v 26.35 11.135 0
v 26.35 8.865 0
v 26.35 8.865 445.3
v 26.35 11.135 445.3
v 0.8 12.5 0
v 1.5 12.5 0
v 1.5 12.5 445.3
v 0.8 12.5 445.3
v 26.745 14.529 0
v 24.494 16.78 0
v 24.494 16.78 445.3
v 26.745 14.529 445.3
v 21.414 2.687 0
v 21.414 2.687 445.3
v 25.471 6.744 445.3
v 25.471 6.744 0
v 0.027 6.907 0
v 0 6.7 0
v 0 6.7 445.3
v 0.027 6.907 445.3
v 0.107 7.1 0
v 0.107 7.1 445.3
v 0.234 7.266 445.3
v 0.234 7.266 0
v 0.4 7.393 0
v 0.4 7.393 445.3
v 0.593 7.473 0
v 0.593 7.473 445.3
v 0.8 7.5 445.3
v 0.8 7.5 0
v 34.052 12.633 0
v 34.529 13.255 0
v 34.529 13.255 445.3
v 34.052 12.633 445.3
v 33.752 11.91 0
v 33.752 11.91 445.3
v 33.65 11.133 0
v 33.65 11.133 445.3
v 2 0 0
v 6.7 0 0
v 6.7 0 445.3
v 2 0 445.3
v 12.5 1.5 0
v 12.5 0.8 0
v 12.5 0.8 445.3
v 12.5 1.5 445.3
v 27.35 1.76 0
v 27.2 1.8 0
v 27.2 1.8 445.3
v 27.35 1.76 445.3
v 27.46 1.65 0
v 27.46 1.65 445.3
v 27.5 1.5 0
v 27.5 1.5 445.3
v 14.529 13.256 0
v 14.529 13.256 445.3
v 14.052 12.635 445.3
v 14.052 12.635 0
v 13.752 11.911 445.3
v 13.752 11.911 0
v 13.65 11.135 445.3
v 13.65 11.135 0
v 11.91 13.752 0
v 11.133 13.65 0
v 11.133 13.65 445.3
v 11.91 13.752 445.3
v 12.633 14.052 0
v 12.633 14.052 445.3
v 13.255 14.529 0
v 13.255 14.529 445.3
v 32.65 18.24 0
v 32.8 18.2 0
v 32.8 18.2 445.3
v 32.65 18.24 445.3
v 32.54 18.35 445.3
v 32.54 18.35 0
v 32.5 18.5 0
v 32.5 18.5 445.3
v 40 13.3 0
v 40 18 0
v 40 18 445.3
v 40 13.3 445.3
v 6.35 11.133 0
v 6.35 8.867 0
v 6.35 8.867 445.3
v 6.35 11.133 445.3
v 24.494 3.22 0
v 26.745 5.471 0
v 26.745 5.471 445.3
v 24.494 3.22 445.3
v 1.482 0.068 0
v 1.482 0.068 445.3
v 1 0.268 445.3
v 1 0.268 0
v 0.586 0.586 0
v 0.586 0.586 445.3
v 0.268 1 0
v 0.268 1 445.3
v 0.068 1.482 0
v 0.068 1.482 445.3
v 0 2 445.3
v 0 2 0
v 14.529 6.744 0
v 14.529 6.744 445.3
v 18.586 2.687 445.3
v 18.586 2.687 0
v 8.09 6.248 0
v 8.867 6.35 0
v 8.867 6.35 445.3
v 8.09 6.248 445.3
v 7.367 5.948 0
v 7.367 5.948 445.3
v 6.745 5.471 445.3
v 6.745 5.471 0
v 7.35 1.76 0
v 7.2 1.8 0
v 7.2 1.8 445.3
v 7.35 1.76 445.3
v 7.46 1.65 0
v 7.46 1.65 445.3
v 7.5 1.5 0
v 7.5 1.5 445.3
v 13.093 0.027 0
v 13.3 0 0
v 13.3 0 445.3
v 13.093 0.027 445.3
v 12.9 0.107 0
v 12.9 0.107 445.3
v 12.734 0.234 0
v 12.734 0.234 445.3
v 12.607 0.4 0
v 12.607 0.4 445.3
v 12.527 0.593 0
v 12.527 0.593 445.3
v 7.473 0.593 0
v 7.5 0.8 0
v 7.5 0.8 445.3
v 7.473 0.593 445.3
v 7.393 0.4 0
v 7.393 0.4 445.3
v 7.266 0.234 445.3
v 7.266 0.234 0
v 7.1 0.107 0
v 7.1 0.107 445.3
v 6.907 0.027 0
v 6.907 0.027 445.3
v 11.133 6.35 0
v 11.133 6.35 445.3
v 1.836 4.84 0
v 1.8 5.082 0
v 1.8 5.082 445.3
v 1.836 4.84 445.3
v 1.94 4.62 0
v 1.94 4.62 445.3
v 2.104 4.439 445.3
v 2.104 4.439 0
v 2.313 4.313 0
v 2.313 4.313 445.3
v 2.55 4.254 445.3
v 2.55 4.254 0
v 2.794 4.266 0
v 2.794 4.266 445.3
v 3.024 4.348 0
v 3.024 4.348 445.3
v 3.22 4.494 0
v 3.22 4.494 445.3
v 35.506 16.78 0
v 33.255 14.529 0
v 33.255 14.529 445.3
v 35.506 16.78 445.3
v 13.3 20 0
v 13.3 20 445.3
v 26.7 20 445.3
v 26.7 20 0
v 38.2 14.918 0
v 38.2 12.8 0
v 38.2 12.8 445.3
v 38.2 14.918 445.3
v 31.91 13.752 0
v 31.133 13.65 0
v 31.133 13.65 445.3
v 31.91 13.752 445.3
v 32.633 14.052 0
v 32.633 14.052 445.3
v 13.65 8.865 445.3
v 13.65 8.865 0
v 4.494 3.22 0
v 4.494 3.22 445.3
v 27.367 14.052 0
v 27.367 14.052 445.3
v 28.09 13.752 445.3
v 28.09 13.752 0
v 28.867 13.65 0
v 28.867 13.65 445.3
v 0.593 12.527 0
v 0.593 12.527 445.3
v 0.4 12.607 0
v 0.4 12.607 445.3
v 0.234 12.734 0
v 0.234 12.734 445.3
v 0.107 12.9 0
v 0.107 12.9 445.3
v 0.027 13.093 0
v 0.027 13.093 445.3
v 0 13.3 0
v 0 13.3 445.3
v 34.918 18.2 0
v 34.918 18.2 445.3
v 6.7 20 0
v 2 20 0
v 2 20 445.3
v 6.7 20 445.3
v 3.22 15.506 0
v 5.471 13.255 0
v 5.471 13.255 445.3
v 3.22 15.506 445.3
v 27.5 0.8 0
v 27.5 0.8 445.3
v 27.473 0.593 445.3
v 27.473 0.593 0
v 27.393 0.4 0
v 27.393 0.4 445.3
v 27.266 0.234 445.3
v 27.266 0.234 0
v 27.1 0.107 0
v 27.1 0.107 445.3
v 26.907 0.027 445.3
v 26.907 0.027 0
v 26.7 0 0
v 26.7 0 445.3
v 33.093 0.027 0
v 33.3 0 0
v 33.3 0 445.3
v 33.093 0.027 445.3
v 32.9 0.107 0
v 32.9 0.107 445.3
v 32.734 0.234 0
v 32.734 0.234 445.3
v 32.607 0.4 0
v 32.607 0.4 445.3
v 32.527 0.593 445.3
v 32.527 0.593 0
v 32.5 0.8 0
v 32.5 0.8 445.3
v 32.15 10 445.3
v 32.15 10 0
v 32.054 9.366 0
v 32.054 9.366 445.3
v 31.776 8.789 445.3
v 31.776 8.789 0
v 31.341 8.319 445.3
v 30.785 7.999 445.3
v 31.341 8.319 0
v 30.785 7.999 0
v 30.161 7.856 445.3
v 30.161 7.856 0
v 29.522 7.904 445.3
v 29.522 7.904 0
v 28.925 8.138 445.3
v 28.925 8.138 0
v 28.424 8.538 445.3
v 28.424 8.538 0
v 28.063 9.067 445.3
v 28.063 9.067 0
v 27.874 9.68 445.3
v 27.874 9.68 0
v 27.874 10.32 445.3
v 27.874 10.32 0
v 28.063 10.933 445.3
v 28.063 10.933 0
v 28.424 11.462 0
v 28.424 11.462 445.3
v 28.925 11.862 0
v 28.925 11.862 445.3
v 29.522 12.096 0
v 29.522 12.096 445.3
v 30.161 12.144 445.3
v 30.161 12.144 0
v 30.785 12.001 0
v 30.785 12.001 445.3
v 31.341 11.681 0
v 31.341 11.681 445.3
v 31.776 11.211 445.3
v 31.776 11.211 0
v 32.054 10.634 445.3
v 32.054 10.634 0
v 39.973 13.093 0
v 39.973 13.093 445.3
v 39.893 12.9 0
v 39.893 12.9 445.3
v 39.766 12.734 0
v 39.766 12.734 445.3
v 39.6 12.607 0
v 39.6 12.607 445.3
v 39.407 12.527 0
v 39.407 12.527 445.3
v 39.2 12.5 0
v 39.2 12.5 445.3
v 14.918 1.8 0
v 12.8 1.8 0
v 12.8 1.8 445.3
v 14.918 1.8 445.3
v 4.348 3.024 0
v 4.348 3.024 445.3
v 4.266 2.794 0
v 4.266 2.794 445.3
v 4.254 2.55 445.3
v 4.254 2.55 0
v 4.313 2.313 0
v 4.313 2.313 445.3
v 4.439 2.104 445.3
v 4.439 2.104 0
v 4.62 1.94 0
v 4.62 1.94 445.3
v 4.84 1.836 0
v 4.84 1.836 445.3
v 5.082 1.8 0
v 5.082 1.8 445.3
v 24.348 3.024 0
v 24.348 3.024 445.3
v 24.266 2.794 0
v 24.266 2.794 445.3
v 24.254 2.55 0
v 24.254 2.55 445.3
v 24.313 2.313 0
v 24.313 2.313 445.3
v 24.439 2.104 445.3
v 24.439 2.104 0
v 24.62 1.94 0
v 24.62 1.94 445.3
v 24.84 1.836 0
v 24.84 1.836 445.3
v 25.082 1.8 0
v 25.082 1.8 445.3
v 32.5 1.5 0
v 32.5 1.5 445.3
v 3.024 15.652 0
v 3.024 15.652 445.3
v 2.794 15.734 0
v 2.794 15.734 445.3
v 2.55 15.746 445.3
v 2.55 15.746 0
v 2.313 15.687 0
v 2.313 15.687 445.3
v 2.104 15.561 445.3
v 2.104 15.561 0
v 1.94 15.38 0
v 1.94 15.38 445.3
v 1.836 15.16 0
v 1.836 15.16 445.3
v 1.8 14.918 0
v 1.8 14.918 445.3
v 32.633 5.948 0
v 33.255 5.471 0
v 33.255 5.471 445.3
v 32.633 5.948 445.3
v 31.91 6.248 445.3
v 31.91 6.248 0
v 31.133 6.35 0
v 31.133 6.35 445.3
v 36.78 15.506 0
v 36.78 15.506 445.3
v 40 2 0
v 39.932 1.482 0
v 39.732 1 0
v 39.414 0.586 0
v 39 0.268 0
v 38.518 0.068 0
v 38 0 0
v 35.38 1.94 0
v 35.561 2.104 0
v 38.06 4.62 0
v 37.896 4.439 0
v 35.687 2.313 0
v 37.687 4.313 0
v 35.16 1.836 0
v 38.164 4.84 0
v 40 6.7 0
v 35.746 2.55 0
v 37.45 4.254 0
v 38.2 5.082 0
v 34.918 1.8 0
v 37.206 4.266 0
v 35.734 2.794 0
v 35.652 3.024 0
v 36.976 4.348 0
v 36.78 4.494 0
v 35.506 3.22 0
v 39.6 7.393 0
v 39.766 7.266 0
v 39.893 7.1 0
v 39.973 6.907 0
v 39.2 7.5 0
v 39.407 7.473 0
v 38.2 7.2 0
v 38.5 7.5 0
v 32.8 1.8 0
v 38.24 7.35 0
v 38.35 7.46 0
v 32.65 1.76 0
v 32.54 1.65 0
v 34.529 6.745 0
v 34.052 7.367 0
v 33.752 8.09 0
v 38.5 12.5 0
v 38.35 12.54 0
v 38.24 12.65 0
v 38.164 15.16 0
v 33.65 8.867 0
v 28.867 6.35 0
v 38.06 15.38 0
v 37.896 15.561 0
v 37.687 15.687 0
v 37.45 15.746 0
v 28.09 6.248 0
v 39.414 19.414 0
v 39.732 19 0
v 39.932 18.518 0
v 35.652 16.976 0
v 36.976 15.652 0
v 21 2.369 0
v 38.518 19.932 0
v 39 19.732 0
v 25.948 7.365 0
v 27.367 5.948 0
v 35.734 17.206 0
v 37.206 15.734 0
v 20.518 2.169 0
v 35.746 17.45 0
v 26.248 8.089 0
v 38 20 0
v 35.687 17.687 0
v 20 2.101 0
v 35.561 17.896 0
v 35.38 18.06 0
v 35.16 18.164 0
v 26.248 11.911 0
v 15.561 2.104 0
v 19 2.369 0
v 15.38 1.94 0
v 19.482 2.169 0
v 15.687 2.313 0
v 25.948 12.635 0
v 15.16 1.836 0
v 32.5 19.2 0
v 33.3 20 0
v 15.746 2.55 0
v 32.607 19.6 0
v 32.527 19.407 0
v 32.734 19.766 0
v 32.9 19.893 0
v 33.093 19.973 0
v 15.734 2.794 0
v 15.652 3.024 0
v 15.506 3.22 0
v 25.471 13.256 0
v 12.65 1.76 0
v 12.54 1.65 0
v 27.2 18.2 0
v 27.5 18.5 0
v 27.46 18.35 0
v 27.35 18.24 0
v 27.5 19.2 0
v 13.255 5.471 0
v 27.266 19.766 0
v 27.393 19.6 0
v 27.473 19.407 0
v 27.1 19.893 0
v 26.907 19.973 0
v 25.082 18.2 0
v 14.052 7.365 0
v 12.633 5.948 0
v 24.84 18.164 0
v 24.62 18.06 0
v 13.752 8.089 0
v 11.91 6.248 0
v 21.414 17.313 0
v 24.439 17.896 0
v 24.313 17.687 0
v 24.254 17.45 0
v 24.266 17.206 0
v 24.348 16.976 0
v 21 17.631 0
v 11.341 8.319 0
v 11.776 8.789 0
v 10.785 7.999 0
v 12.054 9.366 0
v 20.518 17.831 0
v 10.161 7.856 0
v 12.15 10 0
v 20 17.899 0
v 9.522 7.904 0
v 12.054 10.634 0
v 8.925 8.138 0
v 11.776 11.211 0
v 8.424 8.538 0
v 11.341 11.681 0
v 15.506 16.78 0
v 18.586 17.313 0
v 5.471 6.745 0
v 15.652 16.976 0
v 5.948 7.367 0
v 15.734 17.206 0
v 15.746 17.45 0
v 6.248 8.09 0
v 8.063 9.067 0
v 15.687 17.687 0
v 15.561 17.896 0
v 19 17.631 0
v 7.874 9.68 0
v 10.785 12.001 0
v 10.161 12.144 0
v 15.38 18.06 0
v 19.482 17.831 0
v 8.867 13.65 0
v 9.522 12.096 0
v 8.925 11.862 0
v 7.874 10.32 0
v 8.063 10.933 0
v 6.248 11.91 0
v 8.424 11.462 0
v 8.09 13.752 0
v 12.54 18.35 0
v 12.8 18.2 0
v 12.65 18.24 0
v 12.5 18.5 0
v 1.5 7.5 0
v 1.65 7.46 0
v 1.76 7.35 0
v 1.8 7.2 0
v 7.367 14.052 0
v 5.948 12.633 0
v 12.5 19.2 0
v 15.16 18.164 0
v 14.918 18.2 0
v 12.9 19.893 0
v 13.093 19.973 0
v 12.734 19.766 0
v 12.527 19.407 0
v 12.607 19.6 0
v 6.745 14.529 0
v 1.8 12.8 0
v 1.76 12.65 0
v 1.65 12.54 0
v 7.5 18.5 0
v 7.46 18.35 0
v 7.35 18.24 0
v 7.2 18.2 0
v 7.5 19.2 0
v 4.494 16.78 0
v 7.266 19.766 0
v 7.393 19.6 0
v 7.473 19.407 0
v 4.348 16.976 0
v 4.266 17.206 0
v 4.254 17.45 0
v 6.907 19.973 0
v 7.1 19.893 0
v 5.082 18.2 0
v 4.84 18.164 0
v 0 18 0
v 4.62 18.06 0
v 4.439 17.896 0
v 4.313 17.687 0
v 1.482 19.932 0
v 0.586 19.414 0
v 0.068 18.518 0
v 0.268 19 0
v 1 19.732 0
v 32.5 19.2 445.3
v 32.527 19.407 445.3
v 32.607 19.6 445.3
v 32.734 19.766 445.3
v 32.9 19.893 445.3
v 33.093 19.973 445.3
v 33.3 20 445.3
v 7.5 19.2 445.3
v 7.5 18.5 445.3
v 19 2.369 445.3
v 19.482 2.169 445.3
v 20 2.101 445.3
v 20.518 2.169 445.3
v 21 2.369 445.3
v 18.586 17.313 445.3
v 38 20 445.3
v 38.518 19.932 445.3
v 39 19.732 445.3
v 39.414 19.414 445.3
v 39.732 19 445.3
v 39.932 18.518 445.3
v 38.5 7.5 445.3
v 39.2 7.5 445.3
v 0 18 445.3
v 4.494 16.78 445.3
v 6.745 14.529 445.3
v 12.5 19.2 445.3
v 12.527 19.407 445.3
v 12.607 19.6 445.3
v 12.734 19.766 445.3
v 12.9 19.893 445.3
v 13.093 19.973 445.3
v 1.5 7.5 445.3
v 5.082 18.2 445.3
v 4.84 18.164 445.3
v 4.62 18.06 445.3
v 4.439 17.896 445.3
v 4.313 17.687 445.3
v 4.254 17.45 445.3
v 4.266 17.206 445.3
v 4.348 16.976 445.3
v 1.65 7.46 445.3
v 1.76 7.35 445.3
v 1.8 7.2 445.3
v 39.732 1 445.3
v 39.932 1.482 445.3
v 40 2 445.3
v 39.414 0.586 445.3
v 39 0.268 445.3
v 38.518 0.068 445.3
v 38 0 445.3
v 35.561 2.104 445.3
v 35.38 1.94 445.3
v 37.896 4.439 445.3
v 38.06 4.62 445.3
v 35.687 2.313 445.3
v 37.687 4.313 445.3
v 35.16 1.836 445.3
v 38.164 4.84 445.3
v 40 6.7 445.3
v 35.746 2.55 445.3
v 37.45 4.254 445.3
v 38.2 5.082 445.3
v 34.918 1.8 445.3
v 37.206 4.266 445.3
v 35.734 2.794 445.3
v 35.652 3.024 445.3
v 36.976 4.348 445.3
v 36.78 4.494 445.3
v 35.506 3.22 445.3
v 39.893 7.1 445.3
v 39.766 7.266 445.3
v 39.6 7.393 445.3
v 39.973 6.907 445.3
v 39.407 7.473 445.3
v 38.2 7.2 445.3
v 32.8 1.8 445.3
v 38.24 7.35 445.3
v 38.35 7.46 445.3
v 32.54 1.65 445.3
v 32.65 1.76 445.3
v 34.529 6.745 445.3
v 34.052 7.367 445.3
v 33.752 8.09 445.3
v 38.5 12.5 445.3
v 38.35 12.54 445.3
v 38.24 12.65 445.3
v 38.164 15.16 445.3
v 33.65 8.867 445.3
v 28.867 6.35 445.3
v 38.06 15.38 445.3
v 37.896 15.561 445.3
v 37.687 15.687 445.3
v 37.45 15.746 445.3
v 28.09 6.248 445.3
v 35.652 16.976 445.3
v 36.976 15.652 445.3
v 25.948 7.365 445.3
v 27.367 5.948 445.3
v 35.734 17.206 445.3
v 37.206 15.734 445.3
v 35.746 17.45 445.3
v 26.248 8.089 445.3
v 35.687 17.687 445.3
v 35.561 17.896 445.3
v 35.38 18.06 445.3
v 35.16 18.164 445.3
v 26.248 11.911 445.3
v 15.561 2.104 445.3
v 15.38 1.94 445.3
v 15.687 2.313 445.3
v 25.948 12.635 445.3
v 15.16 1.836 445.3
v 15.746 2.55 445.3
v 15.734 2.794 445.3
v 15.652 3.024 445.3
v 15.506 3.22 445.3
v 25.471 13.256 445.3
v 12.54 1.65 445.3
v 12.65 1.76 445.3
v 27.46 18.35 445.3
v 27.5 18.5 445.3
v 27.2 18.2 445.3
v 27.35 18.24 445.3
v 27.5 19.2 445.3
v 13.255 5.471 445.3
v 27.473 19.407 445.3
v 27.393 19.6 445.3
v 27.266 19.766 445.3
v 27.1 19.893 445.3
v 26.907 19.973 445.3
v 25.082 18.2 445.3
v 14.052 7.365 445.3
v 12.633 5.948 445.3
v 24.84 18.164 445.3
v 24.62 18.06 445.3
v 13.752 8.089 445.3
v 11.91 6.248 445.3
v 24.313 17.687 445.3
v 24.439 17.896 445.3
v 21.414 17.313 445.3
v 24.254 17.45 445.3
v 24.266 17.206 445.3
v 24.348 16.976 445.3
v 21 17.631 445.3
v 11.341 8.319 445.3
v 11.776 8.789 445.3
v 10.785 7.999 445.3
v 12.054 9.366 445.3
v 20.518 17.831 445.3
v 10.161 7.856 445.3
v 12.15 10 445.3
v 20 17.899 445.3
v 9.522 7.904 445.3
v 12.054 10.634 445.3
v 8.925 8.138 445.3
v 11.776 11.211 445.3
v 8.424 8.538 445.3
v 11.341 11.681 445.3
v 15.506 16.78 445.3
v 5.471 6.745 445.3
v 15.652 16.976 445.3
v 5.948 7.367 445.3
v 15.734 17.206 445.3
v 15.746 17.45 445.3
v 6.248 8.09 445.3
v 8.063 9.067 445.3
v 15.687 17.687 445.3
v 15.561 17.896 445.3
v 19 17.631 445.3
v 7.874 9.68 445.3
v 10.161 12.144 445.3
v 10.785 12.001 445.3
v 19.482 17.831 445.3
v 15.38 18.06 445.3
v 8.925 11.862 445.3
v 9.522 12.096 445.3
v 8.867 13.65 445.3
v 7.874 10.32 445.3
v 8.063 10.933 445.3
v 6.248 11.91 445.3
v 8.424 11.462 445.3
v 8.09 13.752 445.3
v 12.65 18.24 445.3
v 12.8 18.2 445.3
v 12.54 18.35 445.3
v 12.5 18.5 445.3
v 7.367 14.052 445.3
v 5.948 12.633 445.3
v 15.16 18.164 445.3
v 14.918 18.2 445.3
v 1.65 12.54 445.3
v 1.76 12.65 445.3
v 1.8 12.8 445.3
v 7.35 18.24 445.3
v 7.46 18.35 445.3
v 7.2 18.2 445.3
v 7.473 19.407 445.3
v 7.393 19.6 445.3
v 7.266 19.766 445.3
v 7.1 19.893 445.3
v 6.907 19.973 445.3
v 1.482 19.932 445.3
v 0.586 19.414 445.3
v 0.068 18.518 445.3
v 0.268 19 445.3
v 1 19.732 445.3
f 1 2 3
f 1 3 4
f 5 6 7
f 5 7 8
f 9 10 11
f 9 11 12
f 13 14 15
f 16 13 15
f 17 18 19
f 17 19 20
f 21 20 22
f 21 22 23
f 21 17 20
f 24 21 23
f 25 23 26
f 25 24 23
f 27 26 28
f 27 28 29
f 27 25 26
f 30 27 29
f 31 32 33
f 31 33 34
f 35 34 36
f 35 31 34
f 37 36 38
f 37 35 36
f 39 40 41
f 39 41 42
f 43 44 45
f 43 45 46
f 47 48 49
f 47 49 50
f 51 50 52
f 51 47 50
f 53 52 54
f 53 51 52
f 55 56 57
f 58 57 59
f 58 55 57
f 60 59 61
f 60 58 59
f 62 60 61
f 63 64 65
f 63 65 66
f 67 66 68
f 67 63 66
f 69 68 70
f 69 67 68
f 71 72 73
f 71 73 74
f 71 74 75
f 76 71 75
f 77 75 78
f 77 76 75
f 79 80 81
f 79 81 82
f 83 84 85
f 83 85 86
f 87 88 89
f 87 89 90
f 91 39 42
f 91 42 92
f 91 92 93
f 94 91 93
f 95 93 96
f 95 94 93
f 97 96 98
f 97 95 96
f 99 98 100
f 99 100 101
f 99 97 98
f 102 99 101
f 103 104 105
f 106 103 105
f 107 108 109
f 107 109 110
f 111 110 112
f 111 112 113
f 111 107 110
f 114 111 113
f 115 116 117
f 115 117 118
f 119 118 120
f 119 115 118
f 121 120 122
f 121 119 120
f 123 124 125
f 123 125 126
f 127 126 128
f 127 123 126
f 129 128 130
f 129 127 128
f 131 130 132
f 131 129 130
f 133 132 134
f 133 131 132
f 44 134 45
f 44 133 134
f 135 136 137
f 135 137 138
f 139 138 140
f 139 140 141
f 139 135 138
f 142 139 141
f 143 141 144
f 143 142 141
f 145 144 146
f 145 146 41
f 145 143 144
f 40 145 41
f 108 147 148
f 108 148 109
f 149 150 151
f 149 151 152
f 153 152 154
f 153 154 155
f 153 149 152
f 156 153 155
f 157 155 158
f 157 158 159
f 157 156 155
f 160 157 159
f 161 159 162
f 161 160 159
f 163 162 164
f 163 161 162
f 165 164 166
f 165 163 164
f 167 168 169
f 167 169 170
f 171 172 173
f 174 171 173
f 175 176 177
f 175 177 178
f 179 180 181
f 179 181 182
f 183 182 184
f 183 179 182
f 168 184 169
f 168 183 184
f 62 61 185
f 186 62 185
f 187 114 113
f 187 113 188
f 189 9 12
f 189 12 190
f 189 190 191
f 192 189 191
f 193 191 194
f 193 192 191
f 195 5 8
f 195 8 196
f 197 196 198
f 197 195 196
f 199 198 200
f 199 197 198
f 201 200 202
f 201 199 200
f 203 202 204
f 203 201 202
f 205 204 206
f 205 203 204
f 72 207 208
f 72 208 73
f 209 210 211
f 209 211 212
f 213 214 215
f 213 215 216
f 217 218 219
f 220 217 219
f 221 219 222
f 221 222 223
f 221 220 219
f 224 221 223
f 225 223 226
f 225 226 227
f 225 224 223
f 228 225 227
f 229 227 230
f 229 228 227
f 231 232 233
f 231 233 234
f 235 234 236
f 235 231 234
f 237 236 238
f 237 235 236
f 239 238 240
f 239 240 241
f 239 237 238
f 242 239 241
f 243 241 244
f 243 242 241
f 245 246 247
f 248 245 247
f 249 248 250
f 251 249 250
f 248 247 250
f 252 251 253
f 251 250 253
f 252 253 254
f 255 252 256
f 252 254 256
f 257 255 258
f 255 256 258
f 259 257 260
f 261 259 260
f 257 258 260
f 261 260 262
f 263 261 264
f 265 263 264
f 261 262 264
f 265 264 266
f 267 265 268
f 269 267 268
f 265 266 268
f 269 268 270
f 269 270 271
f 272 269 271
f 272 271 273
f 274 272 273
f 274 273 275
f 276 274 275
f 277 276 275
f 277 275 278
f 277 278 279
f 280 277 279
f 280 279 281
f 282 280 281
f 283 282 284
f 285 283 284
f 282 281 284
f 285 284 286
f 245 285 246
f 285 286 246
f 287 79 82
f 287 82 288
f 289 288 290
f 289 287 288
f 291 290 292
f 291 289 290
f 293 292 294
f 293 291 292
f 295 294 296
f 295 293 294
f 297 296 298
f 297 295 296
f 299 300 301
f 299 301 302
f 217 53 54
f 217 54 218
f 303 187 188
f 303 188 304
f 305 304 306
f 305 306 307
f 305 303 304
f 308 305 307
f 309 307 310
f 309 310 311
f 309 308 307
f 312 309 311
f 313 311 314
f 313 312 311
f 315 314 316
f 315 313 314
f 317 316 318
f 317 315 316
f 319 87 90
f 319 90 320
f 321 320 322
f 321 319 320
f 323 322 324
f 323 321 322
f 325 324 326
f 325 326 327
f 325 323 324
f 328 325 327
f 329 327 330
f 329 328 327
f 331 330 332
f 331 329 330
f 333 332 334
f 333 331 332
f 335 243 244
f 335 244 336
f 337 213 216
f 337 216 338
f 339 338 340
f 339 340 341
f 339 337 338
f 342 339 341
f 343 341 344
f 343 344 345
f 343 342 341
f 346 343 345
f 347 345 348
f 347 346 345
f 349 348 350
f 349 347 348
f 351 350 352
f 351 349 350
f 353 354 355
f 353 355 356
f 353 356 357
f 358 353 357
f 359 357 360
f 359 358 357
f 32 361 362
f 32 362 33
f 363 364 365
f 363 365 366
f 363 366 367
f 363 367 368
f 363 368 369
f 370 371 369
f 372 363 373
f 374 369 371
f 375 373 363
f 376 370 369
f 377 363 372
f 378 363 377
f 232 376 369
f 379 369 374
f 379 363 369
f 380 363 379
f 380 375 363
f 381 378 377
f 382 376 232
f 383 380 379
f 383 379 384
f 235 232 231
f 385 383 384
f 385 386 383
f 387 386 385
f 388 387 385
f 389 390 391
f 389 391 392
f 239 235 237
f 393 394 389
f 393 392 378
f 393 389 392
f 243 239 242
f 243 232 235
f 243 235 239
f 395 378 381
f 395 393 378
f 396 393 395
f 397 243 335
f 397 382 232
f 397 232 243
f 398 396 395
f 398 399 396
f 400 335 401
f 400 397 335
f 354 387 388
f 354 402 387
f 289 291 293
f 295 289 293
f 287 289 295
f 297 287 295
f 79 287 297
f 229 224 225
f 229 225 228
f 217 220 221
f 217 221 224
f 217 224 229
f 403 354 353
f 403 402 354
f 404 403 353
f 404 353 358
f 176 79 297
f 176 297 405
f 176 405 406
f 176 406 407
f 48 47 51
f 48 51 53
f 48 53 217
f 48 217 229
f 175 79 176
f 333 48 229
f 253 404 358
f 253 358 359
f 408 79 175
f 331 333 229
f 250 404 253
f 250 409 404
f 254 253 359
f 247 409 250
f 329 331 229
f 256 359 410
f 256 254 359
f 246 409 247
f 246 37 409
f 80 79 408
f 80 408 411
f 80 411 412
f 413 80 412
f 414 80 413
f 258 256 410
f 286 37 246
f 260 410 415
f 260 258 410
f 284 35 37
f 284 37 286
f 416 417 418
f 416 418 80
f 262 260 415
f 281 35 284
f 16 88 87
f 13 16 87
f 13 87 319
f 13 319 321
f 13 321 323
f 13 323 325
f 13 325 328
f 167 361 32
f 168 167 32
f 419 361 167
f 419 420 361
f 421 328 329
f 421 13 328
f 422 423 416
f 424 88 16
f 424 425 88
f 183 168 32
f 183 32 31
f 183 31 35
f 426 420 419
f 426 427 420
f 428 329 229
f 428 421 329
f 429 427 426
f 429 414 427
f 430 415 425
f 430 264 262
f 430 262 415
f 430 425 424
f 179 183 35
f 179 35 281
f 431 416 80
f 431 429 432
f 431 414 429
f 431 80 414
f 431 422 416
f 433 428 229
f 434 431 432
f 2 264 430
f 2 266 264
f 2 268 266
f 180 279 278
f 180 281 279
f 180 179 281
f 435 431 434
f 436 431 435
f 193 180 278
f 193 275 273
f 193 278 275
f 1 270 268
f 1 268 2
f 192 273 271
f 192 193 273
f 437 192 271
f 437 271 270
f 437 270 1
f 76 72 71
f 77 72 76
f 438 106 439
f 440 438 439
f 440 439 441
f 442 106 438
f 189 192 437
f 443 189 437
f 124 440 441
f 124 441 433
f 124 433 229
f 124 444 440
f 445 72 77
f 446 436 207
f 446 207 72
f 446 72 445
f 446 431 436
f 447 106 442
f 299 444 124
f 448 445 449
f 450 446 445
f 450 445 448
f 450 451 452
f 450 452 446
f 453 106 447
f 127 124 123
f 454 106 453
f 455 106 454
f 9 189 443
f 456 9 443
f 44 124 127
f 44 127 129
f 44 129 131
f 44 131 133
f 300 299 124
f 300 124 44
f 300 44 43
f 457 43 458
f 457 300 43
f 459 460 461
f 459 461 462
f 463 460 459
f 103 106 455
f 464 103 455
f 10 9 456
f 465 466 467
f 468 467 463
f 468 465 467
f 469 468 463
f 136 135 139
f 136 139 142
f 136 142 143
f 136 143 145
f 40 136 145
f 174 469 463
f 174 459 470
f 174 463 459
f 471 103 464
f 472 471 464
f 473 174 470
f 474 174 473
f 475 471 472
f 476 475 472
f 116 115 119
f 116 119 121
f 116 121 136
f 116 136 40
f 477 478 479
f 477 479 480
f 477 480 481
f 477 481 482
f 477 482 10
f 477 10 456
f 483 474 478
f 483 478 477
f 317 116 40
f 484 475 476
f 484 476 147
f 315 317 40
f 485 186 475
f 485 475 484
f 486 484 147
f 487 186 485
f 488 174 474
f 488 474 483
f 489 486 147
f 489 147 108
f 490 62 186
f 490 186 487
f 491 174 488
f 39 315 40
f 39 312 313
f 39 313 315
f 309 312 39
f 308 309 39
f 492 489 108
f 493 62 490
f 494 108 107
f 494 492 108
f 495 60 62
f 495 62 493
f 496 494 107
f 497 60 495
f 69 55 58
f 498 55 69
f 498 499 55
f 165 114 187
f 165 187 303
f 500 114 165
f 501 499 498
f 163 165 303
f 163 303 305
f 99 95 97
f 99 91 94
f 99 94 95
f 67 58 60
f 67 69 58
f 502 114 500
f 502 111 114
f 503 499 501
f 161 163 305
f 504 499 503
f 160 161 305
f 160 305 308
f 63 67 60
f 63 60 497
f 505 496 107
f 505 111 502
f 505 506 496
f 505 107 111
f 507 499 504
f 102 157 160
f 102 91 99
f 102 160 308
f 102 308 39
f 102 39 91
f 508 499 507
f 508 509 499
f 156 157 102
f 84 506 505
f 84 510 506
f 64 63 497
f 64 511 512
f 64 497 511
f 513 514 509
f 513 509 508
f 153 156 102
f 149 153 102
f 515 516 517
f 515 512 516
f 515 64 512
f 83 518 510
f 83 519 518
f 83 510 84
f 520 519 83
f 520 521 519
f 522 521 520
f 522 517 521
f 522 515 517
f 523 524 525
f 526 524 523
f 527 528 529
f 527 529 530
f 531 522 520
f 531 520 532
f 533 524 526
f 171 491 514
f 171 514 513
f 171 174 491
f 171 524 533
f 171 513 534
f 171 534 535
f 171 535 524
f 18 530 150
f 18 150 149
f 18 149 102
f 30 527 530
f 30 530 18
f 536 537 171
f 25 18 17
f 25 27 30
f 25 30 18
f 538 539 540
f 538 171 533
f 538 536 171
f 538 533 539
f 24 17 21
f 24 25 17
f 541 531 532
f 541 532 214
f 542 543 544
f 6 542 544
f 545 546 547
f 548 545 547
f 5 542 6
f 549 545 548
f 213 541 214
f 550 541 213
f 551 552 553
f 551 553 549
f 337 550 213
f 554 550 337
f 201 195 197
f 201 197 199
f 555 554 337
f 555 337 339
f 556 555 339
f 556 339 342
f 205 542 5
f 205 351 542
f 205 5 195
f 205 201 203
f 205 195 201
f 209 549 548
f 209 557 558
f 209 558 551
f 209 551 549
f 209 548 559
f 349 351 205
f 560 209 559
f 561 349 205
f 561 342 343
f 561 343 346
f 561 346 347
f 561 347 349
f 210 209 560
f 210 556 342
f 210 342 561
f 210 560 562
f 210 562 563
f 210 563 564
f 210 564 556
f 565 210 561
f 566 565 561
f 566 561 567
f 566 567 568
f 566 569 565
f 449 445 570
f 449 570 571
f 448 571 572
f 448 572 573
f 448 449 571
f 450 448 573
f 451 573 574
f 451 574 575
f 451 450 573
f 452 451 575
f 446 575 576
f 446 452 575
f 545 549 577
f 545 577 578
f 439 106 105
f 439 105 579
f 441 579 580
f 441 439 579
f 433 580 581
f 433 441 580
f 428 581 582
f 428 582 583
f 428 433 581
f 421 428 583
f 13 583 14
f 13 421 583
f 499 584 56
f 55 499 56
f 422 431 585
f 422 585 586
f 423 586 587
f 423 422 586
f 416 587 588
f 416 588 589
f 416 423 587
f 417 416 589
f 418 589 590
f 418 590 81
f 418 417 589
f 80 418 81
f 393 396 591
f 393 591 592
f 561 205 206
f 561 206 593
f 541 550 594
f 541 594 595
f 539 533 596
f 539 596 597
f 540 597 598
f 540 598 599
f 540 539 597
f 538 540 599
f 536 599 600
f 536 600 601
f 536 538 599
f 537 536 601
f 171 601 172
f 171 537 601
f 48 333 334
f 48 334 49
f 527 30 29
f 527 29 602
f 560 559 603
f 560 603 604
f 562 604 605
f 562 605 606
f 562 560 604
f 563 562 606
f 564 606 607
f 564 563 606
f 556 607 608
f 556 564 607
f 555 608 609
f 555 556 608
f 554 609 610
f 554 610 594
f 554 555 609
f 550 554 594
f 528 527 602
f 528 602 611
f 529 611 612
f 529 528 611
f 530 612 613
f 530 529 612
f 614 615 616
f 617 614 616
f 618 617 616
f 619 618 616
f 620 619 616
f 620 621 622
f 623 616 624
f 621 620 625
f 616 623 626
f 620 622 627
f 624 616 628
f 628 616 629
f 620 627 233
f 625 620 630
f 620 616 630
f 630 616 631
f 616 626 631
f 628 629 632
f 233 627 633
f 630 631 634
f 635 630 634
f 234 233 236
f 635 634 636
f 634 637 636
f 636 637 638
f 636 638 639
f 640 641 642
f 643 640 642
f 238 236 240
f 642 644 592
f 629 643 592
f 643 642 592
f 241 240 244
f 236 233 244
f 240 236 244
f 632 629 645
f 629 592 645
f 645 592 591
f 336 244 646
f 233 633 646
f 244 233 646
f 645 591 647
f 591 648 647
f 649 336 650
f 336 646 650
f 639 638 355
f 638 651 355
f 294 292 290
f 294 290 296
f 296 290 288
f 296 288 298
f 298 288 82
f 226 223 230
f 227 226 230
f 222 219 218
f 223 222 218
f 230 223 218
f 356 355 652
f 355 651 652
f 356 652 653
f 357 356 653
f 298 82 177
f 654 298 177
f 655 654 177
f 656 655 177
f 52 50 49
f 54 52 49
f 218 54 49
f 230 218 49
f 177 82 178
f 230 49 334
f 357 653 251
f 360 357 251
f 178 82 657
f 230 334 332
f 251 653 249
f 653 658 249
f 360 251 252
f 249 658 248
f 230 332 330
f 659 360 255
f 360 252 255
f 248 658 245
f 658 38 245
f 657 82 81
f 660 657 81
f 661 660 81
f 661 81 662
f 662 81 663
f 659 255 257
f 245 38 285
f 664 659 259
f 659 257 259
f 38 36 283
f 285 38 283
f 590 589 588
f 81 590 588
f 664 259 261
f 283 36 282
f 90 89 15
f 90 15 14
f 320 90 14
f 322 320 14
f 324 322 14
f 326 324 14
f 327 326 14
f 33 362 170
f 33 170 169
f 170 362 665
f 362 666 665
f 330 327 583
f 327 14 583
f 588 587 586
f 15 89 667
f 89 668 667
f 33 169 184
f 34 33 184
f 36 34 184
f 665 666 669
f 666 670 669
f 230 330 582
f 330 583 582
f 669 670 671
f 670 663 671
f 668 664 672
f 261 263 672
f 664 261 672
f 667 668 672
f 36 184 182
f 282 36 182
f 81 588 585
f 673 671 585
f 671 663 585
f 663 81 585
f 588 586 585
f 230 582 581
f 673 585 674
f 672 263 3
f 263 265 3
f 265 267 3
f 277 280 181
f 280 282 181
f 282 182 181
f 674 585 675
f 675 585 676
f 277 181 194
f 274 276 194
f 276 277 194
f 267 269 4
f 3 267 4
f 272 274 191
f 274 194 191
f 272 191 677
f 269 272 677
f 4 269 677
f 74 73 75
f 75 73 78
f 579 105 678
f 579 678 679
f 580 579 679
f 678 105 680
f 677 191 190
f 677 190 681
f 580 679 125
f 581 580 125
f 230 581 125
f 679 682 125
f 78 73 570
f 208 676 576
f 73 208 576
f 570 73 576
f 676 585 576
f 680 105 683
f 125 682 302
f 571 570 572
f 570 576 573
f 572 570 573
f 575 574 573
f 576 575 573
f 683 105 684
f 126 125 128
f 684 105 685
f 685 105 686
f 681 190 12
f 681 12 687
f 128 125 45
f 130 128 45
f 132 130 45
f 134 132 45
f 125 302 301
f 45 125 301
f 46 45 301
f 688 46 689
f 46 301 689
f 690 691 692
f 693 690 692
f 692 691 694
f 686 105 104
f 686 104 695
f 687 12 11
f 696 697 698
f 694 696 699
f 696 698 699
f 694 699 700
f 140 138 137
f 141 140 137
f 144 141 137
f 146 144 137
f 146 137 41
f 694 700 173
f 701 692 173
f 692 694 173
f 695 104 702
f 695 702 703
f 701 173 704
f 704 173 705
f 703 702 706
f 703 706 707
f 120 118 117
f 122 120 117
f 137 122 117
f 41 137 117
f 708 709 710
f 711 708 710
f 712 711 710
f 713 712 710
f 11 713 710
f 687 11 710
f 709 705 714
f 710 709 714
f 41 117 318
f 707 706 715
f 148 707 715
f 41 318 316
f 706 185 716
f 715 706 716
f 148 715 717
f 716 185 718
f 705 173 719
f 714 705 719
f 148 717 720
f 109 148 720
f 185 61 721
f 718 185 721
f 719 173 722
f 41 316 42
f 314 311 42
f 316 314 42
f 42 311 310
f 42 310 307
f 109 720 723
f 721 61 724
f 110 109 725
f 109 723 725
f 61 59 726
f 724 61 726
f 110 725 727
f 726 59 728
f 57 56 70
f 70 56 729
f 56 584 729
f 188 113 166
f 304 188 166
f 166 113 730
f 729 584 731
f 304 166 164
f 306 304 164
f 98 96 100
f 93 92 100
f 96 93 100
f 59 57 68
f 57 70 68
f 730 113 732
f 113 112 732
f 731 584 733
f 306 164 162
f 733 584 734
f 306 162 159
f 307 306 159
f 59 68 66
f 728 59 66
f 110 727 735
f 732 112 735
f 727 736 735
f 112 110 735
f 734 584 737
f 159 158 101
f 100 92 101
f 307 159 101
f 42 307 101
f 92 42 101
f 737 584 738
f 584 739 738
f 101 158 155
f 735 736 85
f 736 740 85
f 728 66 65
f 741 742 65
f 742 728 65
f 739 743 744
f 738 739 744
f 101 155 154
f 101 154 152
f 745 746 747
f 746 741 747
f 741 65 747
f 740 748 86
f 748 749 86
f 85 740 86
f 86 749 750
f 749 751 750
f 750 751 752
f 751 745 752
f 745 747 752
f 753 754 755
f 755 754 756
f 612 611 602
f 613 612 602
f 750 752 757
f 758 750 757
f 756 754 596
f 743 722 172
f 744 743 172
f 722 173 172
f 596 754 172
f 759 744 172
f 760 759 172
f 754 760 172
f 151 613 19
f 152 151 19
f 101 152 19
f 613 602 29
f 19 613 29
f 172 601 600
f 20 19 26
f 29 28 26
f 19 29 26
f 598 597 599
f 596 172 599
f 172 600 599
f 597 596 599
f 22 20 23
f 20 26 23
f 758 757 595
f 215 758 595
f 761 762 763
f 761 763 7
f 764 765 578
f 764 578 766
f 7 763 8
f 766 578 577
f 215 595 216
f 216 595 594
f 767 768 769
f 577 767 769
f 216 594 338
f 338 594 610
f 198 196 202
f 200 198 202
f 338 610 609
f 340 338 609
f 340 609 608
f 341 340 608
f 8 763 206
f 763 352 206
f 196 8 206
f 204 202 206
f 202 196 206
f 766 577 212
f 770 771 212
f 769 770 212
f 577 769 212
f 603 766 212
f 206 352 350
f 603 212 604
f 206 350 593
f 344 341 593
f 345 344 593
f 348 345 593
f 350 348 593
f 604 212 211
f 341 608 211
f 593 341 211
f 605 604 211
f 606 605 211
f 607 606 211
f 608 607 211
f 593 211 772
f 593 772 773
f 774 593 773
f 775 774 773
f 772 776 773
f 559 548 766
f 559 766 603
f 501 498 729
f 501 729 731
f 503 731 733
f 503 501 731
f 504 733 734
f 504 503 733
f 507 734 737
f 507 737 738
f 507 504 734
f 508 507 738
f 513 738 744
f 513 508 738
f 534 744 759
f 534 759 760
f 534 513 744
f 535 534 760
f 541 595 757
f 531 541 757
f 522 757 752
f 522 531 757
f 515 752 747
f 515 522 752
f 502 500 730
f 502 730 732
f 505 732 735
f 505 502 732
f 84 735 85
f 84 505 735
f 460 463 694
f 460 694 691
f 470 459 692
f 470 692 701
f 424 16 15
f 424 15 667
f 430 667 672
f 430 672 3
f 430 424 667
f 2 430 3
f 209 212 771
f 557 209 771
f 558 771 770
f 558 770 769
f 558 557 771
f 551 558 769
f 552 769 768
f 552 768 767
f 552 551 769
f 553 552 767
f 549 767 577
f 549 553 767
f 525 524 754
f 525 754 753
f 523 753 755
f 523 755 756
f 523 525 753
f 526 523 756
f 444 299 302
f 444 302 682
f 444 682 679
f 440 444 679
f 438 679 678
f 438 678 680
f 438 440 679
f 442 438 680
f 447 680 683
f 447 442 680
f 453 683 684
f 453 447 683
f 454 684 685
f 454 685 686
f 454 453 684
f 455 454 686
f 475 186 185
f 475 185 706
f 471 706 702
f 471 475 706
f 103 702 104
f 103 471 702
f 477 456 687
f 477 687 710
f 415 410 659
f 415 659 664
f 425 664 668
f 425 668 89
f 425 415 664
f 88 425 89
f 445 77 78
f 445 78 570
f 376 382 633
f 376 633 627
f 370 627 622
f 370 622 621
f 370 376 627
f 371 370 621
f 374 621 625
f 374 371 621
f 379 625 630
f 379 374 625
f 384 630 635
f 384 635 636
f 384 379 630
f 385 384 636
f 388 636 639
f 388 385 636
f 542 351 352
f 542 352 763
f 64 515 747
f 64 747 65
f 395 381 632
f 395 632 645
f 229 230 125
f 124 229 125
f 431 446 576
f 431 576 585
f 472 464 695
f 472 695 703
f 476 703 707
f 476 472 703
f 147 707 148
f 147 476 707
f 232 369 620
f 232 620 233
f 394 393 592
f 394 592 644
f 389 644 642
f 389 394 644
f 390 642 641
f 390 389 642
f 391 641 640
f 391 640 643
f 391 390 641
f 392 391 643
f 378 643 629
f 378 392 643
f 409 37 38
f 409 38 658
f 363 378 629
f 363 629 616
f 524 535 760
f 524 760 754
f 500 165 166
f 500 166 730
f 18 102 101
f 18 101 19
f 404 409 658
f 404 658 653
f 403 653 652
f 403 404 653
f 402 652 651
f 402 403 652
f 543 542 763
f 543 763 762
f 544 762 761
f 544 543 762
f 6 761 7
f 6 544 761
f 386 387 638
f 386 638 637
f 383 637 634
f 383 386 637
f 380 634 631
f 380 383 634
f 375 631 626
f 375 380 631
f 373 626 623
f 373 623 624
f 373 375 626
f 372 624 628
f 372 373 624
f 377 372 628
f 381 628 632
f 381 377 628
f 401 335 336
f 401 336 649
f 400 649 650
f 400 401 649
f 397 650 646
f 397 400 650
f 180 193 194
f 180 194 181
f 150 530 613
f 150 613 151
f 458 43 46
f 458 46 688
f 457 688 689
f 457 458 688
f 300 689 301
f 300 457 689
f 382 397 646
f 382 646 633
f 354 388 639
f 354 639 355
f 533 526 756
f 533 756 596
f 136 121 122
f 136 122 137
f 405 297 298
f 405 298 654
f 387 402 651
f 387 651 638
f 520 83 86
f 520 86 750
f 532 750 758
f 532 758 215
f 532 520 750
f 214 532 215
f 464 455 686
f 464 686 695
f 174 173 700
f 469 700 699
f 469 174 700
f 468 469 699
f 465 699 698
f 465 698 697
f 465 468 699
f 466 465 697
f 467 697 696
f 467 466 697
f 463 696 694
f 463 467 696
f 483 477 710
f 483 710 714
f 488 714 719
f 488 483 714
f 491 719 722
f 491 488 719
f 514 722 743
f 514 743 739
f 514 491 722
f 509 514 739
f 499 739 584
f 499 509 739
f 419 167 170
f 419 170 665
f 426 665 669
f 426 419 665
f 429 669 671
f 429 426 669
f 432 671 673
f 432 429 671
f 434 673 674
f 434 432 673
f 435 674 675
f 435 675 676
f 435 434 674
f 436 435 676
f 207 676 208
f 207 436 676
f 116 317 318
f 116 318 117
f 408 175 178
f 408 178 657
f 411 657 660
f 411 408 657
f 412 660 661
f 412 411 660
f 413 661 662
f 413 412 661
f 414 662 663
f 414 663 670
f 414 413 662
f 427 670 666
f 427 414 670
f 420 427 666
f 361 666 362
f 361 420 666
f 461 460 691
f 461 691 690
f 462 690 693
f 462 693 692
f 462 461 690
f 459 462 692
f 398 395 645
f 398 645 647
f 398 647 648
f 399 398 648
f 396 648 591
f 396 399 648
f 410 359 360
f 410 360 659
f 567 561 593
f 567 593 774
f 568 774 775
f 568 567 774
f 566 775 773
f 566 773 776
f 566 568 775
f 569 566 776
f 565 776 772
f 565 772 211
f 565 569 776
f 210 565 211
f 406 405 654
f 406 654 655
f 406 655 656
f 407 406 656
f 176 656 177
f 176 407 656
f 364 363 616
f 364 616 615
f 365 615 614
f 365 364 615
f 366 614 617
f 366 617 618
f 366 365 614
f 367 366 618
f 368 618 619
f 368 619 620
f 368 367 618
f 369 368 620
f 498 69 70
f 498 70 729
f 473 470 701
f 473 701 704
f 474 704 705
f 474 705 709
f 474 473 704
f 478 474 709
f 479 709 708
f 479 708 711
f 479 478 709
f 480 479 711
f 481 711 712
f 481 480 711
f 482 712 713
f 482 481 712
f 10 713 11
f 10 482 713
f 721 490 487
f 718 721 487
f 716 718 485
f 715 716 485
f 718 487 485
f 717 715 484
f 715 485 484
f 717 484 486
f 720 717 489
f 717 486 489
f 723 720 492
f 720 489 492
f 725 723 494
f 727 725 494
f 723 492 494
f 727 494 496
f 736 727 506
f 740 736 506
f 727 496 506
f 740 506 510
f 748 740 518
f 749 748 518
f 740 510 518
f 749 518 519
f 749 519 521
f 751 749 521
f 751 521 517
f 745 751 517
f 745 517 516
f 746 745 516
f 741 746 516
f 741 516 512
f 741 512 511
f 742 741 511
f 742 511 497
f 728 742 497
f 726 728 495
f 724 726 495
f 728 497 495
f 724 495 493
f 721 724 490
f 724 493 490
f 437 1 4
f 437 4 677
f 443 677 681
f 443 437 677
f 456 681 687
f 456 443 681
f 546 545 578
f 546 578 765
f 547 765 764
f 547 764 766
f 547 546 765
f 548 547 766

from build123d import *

# Parameters (mm, degrees)
ESQUISSE1_R      = 2.15
EXTRUSION1_DEPTH = 445.3


with BuildPart() as part:
    # Esquisse1 → Extrusion1 (new body)
    with BuildSketch(Plane(origin=(0, 0, 0), x_dir=(-1, 0, 0), z_dir=(0, 0, -1))):
        with BuildLine():
            Line((-38, 0), (-33.3, 0))
            ThreePointArc((-33.3, 0), (-32.734314575, 0.234314575), (-32.5, 0.8))
            Line((-32.5, 0.8), (-32.5, 1.5))
            ThreePointArc((-32.5, 1.5), (-32.587867966, 1.712132034), (-32.8, 1.8))
            Line((-32.8, 1.8), (-34.918424061, 1.8))
            ThreePointArc((-34.918424061, 1.8), (-35.686700051, 2.313345604), (-35.506437047, 3.219588924))
            Line((-35.506437047, 3.219588924), (-33.254705627, 5.471320344))
            ThreePointArc((-33.254705627, 5.471320344), (-32.281435581, 6.121638598), (-31.133385284, 6.35))
            Line((-31.133385284, 6.35), (-28.866614716, 6.35))
            ThreePointArc((-28.866614716, 6.35), (-27.718564419, 6.121638598), (-26.745294373, 5.471320344))
            Line((-26.745294373, 5.471320344), (-24.493562953, 3.219588924))
            ThreePointArc((-24.493562953, 3.219588924), (-24.313299949, 2.313345604), (-25.081575939, 1.8))
            Line((-25.081575939, 1.8), (-27.2, 1.8))
            ThreePointArc((-27.2, 1.8), (-27.412132034, 1.712132034), (-27.5, 1.5))
            Line((-27.5, 1.5), (-27.5, 0.8))
            ThreePointArc((-27.5, 0.8), (-27.265685425, 0.234314575), (-26.7, 0))
            Line((-26.7, 0), (-13.3, 0))
            ThreePointArc((-13.3, 0), (-12.734314575, 0.234314575), (-12.5, 0.8))
            Line((-12.5, 0.8), (-12.5, 1.5))
            ThreePointArc((-12.5, 1.5), (-12.587867966, 1.712132034), (-12.8, 1.8))
            Line((-12.8, 1.8), (-14.918424061, 1.8))
            ThreePointArc((-14.918424061, 1.8), (-15.686700051, 2.313345604), (-15.506437047, 3.219588924))
            Line((-15.506437047, 3.219588924), (-13.254705627, 5.471320344))
            ThreePointArc((-13.254705627, 5.471320344), (-12.281435581, 6.121638598), (-11.133385284, 6.35))
            Line((-11.133385284, 6.35), (-8.866614716, 6.35))
            ThreePointArc((-8.866614716, 6.35), (-7.718564419, 6.121638598), (-6.745294373, 5.471320344))
            Line((-6.745294373, 5.471320344), (-4.493562953, 3.219588924))
            ThreePointArc((-4.493562953, 3.219588924), (-4.313299949, 2.313345604), (-5.081575939, 1.8))
            Line((-5.081575939, 1.8), (-7.2, 1.8))
            ThreePointArc((-7.2, 1.8), (-7.412132034, 1.712132034), (-7.5, 1.5))
            Line((-7.5, 1.5), (-7.5, 0.8))
            ThreePointArc((-7.5, 0.8), (-7.265685425, 0.234314575), (-6.7, 0))
            Line((-6.7, 0), (-2, 0))
            ThreePointArc((-2, 0), (-0.585786438, 0.585786438), (0, 2))
            Line((0, 2), (0, 6.7))
            ThreePointArc((0, 6.7), (-0.234314575, 7.265685425), (-0.8, 7.5))
            Line((-0.8, 7.5), (-1.5, 7.5))
            ThreePointArc((-1.5, 7.5), (-1.712132034, 7.412132034), (-1.8, 7.2))
            Line((-1.8, 7.2), (-1.8, 5.081575939))
            ThreePointArc((-1.8, 5.081575939), (-2.313345604, 4.313299949), (-3.219588924, 4.493562953))
            Line((-3.219588924, 4.493562953), (-5.471320344, 6.745294373))
            ThreePointArc((-5.471320344, 6.745294373), (-6.121638598, 7.718564419), (-6.35, 8.866614716))
            Line((-6.35, 8.866614716), (-6.35, 11.133385284))
            ThreePointArc((-6.35, 11.133385284), (-6.121638598, 12.281435581), (-5.471320344, 13.254705627))
            Line((-5.471320344, 13.254705627), (-3.219588924, 15.506437047))
            ThreePointArc((-3.219588924, 15.506437047), (-2.313345604, 15.686700051), (-1.8, 14.918424061))
            Line((-1.8, 14.918424061), (-1.8, 12.8))
            ThreePointArc((-1.8, 12.8), (-1.712132034, 12.587867966), (-1.5, 12.5))
            Line((-1.5, 12.5), (-0.8, 12.5))
            ThreePointArc((-0.8, 12.5), (-0.234314575, 12.734314575), (0, 13.3))
            Line((0, 13.3), (0, 18))
            ThreePointArc((0, 18), (-0.585786438, 19.414213562), (-2, 20))
            Line((-2, 20), (-6.7, 20))
            ThreePointArc((-6.7, 20), (-7.265685425, 19.765685425), (-7.5, 19.2))
            Line((-7.5, 19.2), (-7.5, 18.5))
            ThreePointArc((-7.5, 18.5), (-7.412132034, 18.287867966), (-7.2, 18.2))
            Line((-7.2, 18.2), (-5.081575939, 18.2))
            ThreePointArc((-5.081575939, 18.2), (-4.313299949, 17.686654396), (-4.493562953, 16.780411076))
            Line((-4.493562953, 16.780411076), (-6.745294373, 14.528679656))
            ThreePointArc((-6.745294373, 14.528679656), (-7.718564419, 13.878361402), (-8.866614716, 13.65))
            Line((-8.866614716, 13.65), (-11.133385284, 13.65))
            ThreePointArc((-11.133385284, 13.65), (-12.281435581, 13.878361402), (-13.254705627, 14.528679656))
            Line((-13.254705627, 14.528679656), (-15.506437047, 16.780411076))
            ThreePointArc((-15.506437047, 16.780411076), (-15.686700051, 17.686654396), (-14.918424061, 18.2))
            Line((-14.918424061, 18.2), (-12.8, 18.2))
            ThreePointArc((-12.8, 18.2), (-12.587867966, 18.287867966), (-12.5, 18.5))
            Line((-12.5, 18.5), (-12.5, 19.2))
            ThreePointArc((-12.5, 19.2), (-12.734314575, 19.765685425), (-13.3, 20))
            Line((-13.3, 20), (-26.7, 20))
            ThreePointArc((-26.7, 20), (-27.265685425, 19.765685425), (-27.5, 19.2))
            Line((-27.5, 19.2), (-27.5, 18.5))
            ThreePointArc((-27.5, 18.5), (-27.412132034, 18.287867966), (-27.2, 18.2))
            Line((-27.2, 18.2), (-25.081575939, 18.2))
            ThreePointArc((-25.081575939, 18.2), (-24.313299949, 17.686654396), (-24.493562953, 16.780411076))
            Line((-24.493562953, 16.780411076), (-26.745294373, 14.528679656))
            ThreePointArc((-26.745294373, 14.528679656), (-27.718564419, 13.878361402), (-28.866614716, 13.65))
            Line((-28.866614716, 13.65), (-31.133385284, 13.65))
            ThreePointArc((-31.133385284, 13.65), (-32.281435581, 13.878361402), (-33.254705627, 14.528679656))
            Line((-33.254705627, 14.528679656), (-35.506437047, 16.780411076))
            ThreePointArc((-35.506437047, 16.780411076), (-35.686700051, 17.686654396), (-34.918424061, 18.2))
            Line((-34.918424061, 18.2), (-32.8, 18.2))
            ThreePointArc((-32.8, 18.2), (-32.587867966, 18.287867966), (-32.5, 18.5))
            Line((-32.5, 18.5), (-32.5, 19.2))
            ThreePointArc((-32.5, 19.2), (-32.734314575, 19.765685425), (-33.3, 20))
            Line((-33.3, 20), (-38, 20))
            ThreePointArc((-38, 20), (-39.414213562, 19.414213562), (-40, 18))
            Line((-40, 18), (-40, 13.3))
            ThreePointArc((-40, 13.3), (-39.765685425, 12.734314575), (-39.2, 12.5))
            Line((-39.2, 12.5), (-38.5, 12.5))
            ThreePointArc((-38.5, 12.5), (-38.287867966, 12.587867966), (-38.2, 12.8))
            Line((-38.2, 12.8), (-38.2, 14.918424061))
            ThreePointArc((-38.2, 14.918424061), (-37.686654396, 15.686700051), (-36.780411076, 15.506437047))
            Line((-36.780411076, 15.506437047), (-34.528679656, 13.254705627))
            ThreePointArc((-34.528679656, 13.254705627), (-33.878361402, 12.281435581), (-33.65, 11.133385284))
            Line((-33.65, 11.133385284), (-33.65, 8.866614716))
            ThreePointArc((-33.65, 8.866614716), (-33.878361402, 7.718564419), (-34.528679656, 6.745294373))
            Line((-34.528679656, 6.745294373), (-36.780411076, 4.493562953))
            ThreePointArc((-36.780411076, 4.493562953), (-37.686654396, 4.313299949), (-38.2, 5.081575939))
            Line((-38.2, 5.081575939), (-38.2, 7.2))
            ThreePointArc((-38.2, 7.2), (-38.287867966, 7.412132034), (-38.5, 7.5))
            Line((-38.5, 7.5), (-39.2, 7.5))
            ThreePointArc((-39.2, 7.5), (-39.765685425, 7.265685425), (-40, 6.7))
            Line((-40, 6.7), (-40, 2))
            ThreePointArc((-40, 2), (-39.414213562, 0.585786438), (-38, 0))
        make_face()
        with Locations(Location((-10, 10, 0), (0, 0, 180))):
            Circle(ESQUISSE1_R, mode=Mode.SUBTRACT)
        with Locations(Location((-30, 10, 0), (0, 0, 180))):
            Circle(ESQUISSE1_R, mode=Mode.SUBTRACT)
        with BuildLine():
            Line((-13.650001154, 11.134569154), (-13.650001154, 8.865431094))
            ThreePointArc((-13.650001154, 8.865431094), (-13.878362476, 7.717381202), (-14.5286805, 6.7441115))
            Line((-14.5286805, 6.7441115), (-18.585786, 2.687006))
            ThreePointArc((-18.585786, 2.687006), (-19.999999562, 2.101219562), (-21.414213125, 2.687006))
            Line((-21.414213125, 2.687006), (-25.471320125, 6.744113))
            ThreePointArc((-25.471320125, 6.744113), (-26.121638379, 7.717383046), (-26.349999781, 8.865433344))
            Line((-26.349999781, 8.865433344), (-26.349999781, 11.134567344))
            ThreePointArc((-26.349999781, 11.134567344), (-26.121638308, 12.282617811), (-25.471319863, 13.255887949))
            Line((-25.471319863, 13.255887949), (-21.41421295, 17.312993861))
            ThreePointArc((-21.41421295, 17.312993861), (-19.999999562, 17.898780125), (-18.585786174, 17.312993861))
            Line((-18.585786174, 17.312993861), (-14.528681072, 13.255889759))
            ThreePointArc((-14.528681072, 13.255889759), (-13.878362627, 12.282619622), (-13.650001154, 11.134569154))
        make_face(mode=Mode.SUBTRACT)
    extrude(amount=-EXTRUSION1_DEPTH)


solid = part.part
